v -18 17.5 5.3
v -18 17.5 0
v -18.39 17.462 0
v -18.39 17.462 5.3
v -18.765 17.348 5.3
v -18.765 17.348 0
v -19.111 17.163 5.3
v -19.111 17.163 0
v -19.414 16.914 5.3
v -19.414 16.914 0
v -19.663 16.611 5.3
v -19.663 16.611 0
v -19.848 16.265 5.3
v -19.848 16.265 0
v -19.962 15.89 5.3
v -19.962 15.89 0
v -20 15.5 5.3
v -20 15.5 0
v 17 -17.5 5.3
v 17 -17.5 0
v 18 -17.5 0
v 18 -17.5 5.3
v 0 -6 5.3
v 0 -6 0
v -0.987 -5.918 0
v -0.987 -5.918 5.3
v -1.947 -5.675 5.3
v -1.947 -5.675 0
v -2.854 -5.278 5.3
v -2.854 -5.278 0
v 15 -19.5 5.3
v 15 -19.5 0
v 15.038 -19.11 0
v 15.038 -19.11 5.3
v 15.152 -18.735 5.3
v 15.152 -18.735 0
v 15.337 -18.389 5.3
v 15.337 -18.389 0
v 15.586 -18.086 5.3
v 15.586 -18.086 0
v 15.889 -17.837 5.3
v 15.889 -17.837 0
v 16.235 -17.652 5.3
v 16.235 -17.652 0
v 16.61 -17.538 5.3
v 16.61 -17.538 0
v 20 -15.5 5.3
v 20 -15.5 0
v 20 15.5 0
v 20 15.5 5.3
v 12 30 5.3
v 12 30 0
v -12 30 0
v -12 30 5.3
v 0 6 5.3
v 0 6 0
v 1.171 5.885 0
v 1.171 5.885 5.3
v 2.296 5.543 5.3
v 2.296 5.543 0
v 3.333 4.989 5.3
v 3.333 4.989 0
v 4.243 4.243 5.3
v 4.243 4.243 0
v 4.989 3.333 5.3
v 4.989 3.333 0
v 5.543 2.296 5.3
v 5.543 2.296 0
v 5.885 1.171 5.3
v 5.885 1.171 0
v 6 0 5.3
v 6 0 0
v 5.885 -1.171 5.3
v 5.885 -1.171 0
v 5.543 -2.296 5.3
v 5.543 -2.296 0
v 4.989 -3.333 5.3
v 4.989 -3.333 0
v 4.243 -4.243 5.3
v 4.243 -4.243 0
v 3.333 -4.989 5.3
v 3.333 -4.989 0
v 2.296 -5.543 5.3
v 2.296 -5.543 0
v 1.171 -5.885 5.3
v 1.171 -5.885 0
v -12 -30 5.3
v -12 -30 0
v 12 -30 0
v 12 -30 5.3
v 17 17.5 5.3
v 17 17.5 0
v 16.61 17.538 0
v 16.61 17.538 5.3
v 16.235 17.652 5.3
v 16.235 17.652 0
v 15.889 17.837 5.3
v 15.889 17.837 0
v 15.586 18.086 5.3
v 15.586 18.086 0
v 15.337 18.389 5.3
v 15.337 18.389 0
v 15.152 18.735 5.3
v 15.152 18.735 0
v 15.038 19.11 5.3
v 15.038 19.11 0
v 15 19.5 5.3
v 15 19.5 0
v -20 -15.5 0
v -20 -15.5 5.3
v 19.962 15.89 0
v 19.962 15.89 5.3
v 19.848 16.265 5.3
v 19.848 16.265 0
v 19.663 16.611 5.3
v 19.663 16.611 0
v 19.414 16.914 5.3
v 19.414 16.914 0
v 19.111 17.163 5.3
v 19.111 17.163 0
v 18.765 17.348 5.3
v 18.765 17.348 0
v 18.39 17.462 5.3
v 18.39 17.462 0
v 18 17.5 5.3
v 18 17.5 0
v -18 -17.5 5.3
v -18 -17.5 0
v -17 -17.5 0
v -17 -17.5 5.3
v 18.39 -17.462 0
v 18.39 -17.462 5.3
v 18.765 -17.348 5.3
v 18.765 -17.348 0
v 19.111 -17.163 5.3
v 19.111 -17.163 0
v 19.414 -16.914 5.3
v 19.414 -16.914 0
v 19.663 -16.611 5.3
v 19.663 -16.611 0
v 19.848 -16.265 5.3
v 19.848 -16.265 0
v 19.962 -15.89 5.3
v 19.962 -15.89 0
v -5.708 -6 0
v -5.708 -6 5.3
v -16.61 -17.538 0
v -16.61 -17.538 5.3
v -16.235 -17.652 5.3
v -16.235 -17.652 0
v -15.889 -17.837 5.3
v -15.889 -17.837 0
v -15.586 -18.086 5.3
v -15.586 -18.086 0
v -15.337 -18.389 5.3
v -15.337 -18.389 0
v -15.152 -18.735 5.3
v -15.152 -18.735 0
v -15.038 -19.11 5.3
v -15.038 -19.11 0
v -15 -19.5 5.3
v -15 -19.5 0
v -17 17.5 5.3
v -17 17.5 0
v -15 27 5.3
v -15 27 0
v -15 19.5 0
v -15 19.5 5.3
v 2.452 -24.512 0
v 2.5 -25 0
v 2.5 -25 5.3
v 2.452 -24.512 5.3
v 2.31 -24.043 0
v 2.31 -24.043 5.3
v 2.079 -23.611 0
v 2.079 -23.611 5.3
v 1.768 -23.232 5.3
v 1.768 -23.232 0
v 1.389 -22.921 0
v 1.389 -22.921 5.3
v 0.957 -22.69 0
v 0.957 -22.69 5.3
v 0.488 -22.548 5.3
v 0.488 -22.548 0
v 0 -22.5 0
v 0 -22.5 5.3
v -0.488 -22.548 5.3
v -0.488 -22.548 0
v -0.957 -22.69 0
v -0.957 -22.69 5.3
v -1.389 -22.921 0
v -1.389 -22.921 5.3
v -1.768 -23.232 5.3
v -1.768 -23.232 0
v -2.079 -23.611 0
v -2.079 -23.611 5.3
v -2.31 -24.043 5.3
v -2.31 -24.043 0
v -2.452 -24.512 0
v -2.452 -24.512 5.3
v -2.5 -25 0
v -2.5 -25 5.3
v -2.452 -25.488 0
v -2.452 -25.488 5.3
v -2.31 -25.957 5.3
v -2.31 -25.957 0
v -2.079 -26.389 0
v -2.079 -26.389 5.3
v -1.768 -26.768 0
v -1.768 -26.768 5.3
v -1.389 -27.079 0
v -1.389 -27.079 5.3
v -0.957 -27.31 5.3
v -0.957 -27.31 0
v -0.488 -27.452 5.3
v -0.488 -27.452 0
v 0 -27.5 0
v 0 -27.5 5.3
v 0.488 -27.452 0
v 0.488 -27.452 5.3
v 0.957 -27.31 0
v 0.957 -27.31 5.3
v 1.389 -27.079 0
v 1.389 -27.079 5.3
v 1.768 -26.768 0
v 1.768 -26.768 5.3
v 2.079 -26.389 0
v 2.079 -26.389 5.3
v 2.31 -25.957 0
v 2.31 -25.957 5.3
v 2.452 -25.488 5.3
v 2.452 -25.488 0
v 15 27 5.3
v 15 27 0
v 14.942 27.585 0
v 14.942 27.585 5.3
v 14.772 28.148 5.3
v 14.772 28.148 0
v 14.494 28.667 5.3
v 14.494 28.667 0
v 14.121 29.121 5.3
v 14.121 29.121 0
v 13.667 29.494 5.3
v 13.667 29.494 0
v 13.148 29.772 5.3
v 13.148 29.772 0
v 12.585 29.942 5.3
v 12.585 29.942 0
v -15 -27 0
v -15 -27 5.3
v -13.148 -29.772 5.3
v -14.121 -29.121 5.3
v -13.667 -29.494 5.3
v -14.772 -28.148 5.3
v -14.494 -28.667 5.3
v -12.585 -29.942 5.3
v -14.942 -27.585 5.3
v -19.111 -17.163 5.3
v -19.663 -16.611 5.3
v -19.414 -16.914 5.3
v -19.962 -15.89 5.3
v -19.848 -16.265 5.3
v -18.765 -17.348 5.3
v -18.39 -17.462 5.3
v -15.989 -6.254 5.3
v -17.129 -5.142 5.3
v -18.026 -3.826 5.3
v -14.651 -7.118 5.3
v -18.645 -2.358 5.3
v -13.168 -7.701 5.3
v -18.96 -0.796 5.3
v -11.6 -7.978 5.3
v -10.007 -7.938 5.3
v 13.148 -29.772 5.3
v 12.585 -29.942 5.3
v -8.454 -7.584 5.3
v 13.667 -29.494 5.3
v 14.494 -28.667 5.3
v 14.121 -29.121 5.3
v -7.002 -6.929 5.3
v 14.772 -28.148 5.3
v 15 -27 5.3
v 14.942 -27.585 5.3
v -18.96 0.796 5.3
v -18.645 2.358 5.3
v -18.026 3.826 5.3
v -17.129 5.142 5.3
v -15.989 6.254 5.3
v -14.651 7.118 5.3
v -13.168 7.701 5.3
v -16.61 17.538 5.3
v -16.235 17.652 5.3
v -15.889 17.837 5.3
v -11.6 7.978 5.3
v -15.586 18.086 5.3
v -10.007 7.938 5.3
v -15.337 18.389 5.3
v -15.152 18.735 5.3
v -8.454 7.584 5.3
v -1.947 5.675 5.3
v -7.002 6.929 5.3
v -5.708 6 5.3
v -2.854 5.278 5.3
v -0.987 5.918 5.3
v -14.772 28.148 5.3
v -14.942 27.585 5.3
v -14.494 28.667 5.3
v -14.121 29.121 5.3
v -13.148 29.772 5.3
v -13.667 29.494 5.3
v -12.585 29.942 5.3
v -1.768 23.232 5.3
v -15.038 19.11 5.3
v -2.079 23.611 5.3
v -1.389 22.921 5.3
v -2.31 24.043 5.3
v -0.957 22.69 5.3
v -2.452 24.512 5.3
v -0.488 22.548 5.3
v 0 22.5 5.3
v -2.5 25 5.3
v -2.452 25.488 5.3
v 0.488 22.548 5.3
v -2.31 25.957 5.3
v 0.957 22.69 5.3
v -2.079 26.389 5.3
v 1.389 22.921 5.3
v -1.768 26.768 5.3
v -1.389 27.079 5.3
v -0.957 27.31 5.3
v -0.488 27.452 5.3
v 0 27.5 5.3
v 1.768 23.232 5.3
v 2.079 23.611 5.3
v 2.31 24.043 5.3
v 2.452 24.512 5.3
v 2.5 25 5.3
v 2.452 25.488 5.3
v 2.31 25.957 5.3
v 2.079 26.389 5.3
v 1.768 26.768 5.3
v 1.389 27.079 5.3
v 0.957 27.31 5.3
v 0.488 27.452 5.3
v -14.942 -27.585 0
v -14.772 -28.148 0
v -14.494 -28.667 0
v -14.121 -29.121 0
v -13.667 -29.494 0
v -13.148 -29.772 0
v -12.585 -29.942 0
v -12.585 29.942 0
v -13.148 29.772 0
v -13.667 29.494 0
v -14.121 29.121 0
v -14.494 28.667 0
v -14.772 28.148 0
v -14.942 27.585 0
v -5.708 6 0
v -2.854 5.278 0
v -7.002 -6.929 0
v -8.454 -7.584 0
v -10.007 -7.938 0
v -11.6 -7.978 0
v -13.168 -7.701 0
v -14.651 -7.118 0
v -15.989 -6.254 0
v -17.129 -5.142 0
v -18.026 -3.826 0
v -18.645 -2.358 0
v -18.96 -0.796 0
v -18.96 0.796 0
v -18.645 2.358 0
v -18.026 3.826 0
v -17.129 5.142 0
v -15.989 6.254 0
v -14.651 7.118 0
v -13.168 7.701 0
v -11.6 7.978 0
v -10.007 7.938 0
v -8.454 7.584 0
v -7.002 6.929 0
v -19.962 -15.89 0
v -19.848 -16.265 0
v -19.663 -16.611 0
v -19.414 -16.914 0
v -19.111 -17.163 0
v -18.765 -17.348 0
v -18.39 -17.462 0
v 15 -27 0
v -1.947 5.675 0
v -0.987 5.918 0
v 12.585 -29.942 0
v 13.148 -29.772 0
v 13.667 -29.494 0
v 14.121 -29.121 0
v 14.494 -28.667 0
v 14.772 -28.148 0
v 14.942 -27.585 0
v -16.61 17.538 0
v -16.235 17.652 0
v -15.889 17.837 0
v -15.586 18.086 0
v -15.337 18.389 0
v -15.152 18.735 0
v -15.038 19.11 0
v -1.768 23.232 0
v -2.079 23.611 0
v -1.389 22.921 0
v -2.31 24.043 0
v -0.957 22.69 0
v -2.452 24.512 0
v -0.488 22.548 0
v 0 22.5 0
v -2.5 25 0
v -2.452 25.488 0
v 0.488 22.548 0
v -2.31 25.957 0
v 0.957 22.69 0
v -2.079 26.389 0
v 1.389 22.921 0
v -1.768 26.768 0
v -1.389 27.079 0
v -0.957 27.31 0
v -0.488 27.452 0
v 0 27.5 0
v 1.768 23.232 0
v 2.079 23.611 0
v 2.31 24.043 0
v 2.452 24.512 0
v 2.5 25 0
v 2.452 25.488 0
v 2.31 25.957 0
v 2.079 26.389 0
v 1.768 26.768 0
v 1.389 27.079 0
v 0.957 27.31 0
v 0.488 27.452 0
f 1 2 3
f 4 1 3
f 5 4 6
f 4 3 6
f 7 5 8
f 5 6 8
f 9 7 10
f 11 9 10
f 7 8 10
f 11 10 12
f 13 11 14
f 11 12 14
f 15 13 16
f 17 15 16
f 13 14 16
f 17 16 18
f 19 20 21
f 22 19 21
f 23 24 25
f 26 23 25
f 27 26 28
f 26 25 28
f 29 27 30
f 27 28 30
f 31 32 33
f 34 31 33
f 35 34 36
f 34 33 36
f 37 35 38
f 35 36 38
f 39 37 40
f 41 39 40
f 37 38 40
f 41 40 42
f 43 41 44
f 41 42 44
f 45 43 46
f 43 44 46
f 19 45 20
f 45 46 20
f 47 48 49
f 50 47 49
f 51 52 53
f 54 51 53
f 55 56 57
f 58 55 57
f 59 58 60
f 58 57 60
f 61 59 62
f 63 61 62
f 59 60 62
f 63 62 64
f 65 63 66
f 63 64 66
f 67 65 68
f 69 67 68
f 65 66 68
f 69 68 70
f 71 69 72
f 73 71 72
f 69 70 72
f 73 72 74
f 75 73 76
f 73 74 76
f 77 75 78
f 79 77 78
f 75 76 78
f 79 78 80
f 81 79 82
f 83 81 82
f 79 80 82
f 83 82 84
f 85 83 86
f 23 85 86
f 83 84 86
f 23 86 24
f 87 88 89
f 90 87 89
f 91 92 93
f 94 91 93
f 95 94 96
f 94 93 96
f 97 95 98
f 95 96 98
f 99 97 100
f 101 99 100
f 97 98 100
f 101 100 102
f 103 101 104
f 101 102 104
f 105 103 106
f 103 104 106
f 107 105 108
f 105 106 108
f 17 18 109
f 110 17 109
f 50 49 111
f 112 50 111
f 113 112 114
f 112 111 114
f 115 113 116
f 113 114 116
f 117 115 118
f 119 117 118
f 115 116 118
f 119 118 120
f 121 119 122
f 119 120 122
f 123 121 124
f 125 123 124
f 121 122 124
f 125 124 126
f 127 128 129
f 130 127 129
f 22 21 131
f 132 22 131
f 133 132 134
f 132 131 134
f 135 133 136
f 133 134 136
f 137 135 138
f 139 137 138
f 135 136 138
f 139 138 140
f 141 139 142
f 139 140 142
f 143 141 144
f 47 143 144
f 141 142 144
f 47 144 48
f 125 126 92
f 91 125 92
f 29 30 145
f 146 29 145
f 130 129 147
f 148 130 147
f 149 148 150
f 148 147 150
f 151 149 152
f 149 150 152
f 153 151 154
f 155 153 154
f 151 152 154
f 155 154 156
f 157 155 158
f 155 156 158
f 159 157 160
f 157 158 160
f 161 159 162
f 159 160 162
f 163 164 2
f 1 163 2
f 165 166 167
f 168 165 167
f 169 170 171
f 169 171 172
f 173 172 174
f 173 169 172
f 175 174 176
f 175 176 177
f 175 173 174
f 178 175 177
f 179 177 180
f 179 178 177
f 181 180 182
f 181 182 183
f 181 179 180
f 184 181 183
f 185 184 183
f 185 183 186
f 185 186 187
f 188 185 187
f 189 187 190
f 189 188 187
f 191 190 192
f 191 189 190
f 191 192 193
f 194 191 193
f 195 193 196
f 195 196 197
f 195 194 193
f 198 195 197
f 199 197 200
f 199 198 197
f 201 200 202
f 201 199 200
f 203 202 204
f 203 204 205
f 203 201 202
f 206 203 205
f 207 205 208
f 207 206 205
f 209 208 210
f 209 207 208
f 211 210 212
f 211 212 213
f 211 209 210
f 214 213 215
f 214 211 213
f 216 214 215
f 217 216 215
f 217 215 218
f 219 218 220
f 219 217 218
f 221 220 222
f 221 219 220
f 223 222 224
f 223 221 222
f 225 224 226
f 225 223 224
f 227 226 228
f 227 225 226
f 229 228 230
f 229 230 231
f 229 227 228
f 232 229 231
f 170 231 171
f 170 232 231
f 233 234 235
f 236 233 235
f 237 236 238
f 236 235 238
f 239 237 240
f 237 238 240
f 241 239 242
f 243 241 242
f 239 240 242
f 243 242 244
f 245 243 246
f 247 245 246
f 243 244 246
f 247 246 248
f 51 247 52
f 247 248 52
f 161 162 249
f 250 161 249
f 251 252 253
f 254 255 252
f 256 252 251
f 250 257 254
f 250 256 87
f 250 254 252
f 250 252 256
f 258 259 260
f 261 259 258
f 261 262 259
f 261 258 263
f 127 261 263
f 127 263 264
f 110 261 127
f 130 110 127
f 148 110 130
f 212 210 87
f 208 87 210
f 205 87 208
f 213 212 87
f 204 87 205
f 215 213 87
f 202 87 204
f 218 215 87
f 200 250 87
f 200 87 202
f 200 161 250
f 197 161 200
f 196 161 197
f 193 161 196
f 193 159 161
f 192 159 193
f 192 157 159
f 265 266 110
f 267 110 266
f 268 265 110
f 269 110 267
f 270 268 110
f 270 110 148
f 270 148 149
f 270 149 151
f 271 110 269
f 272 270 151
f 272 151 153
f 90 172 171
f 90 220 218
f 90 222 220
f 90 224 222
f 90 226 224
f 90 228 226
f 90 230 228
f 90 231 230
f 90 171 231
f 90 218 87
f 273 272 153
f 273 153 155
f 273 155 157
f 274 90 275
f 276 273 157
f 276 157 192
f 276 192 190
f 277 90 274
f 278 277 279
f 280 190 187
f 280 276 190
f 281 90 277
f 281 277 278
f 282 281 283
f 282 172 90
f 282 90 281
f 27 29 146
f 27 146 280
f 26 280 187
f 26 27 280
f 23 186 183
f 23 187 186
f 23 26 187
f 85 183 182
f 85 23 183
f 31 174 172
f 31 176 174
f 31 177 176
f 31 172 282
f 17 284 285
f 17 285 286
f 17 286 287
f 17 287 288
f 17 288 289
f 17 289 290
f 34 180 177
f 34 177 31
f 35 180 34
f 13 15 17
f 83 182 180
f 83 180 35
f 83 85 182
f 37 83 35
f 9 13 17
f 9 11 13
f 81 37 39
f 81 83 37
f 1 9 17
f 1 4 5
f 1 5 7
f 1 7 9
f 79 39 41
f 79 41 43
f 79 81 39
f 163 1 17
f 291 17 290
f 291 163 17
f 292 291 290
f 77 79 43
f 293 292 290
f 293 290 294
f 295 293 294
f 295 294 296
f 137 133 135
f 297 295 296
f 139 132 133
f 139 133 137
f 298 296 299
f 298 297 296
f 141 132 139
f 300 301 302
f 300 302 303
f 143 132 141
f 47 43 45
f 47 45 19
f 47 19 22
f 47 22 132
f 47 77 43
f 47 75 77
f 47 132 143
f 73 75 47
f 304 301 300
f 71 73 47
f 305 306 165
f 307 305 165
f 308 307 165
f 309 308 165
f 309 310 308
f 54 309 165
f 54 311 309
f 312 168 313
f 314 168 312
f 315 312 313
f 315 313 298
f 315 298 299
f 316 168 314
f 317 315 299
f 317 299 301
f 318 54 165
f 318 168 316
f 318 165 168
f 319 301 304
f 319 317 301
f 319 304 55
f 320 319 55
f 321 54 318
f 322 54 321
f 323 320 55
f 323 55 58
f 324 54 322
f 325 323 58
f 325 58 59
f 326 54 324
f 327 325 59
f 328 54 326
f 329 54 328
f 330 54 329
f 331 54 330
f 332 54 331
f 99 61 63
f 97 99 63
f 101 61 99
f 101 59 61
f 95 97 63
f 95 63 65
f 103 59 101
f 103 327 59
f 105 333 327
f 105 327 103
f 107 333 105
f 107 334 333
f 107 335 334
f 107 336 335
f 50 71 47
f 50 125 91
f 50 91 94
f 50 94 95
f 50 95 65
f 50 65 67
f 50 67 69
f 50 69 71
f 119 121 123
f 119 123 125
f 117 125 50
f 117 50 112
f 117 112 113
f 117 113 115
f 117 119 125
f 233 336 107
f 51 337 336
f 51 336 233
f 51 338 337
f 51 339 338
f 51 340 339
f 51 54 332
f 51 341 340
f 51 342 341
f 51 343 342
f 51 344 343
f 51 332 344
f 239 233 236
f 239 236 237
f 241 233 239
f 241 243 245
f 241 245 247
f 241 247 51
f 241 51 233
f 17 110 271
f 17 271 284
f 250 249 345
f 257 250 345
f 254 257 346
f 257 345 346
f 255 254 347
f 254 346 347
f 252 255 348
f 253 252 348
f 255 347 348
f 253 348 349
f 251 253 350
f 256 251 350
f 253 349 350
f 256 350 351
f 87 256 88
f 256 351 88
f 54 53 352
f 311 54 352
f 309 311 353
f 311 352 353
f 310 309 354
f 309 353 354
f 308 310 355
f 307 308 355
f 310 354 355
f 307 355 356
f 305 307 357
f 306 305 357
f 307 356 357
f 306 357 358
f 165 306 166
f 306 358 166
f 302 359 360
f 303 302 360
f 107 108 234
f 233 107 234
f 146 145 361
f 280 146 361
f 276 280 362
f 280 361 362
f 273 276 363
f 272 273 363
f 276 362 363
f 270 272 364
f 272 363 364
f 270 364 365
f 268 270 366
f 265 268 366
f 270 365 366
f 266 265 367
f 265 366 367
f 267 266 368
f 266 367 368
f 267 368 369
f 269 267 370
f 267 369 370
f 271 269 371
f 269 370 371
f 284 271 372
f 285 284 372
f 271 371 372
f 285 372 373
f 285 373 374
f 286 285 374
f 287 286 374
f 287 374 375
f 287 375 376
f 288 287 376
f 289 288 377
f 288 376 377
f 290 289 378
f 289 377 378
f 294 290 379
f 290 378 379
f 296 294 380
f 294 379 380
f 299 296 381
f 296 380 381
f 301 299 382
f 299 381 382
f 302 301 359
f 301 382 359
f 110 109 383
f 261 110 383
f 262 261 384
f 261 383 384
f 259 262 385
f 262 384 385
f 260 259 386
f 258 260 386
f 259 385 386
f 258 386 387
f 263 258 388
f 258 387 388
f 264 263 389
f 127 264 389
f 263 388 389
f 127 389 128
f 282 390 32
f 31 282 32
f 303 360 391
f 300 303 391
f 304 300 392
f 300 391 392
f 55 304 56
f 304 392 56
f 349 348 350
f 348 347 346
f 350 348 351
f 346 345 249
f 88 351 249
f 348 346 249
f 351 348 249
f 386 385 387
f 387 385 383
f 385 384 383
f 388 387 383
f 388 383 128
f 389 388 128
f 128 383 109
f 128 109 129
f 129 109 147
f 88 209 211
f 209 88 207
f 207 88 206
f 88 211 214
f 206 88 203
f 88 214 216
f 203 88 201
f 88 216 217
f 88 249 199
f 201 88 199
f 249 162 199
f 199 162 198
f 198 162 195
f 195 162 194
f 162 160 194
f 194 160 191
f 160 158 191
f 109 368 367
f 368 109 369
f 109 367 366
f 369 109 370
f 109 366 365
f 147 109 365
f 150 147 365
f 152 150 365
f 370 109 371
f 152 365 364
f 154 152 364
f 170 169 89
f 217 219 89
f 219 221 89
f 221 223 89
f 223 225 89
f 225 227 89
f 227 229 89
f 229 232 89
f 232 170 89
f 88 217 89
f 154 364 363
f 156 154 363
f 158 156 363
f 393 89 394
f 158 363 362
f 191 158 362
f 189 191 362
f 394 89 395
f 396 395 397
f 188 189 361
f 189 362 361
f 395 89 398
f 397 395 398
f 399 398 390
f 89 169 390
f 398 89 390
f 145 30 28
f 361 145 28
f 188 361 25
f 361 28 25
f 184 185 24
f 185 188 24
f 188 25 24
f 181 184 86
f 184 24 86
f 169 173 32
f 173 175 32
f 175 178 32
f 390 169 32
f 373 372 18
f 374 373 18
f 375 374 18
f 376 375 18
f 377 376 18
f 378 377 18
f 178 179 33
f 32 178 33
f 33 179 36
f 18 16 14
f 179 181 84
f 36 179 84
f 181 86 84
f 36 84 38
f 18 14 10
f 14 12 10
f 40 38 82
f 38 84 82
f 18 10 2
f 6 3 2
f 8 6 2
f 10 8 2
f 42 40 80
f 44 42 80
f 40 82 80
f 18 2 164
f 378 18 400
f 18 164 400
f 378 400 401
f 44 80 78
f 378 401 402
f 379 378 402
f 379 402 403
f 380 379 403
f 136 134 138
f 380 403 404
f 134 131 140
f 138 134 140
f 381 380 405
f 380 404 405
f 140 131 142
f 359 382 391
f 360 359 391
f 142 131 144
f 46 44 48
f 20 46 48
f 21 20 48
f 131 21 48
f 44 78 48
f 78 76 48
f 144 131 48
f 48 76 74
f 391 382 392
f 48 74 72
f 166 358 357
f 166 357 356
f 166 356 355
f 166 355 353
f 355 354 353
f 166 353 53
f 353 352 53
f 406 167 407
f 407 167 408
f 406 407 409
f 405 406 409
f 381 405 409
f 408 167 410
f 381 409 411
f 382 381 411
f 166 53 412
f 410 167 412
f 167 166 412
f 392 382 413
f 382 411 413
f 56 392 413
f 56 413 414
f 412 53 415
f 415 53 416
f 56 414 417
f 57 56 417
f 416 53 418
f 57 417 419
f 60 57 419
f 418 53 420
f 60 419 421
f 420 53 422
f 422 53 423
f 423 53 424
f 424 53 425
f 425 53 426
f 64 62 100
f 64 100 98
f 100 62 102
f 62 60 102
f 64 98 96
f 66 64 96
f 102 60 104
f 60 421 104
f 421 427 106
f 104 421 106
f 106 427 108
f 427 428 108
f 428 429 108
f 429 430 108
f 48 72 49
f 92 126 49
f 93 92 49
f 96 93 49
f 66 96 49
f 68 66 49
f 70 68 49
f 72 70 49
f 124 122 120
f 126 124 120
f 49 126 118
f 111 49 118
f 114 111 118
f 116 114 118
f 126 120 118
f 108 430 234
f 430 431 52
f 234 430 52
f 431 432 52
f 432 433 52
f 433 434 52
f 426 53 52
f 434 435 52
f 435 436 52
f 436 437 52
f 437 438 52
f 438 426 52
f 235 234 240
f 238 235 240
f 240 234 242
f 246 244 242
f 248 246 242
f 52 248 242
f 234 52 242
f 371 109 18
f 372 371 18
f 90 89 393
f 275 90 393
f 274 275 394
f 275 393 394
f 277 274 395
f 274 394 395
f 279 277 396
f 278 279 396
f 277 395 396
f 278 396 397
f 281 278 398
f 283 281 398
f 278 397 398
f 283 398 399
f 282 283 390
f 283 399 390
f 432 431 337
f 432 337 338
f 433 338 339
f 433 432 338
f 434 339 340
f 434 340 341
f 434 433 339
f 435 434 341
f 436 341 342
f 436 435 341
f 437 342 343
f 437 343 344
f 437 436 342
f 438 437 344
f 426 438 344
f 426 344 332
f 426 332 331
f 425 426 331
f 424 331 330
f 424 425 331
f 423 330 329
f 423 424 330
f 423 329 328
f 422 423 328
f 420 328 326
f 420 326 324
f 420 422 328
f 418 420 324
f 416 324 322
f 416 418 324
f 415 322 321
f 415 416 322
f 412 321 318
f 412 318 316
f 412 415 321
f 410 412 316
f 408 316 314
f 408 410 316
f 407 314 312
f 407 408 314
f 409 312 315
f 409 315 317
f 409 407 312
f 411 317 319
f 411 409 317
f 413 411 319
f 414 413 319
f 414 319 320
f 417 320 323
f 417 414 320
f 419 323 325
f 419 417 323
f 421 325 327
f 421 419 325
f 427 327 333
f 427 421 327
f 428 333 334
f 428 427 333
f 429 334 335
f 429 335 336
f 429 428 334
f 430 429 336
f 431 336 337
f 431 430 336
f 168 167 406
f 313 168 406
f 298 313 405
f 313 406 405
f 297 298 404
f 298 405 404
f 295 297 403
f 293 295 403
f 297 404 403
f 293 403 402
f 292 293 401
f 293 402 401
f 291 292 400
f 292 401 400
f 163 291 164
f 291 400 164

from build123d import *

# Parameters (mm, degrees)
F0_R     = 2.5
F1_DEPTH = 5.3


with BuildPart() as f1:
    # F0 (on Top) → F1 (new body)
    with BuildSketch(Plane.XY):
        with BuildLine():
            Line((-12, -30), (12, -30))
            ThreePointArc((12, -30), (14.12132, -29.12132), (15, -27))
            Line((15, -27), (15, -19.5))
            ThreePointArc((15, -19.5), (15.585786, -18.085786), (17, -17.5))
            Line((17, -17.5), (18, -17.5))
            ThreePointArc((18, -17.5), (19.414214, -16.914214), (20, -15.5))
            Line((20, -15.5), (20, 15.5))
            ThreePointArc((20, 15.5), (19.414214, 16.914214), (18, 17.5))
            Line((18, 17.5), (17, 17.5))
            ThreePointArc((17, 17.5), (15.585786, 18.085786), (15, 19.5))
            Line((15, 19.5), (15, 27))
            ThreePointArc((15, 27), (14.12132, 29.12132), (12, 30))
            Line((12, 30), (-12, 30))
            ThreePointArc((-12, 30), (-14.12132, 29.12132), (-15, 27))
            Line((-15, 27), (-15, 19.5))
            ThreePointArc((-15, 19.5), (-15.585786, 18.085786), (-17, 17.5))
            Line((-17, 17.5), (-18, 17.5))
            ThreePointArc((-18, 17.5), (-19.414214, 16.914214), (-20, 15.5))
            Line((-20, 15.5), (-20, -15.5))
            ThreePointArc((-20, -15.5), (-19.414214, -16.914214), (-18, -17.5))
            Line((-18, -17.5), (-17, -17.5))
            ThreePointArc((-17, -17.5), (-15.585786, -18.085786), (-15, -19.5))
            Line((-15, -19.5), (-15, -27))
            ThreePointArc((-15, -27), (-14.12132, -29.12132), (-12, -30))
        make_face()
        with Locations((0, -25)):
            Circle(F0_R, mode=Mode.SUBTRACT)
        with BuildLine():
            ThreePointArc((-5.708497, -6), (-19, 0), (-5.708497, 6))
            Line((-5.708497, 6), (-2.854249, 5.277619))
            ThreePointArc((-2.854249, 5.277619), (-1.472122, 5.816602), (0, 6))
            ThreePointArc((0, 6), (6, 0), (0, -6))
            ThreePointArc((0, -6), (-1.472122, -5.816602), (-2.854249, -5.277619))
            Line((-2.854249, -5.277619), (-5.708497, -6))
        make_face(mode=Mode.SUBTRACT)
        with Locations((0, 25)):
            Circle(F0_R, mode=Mode.SUBTRACT)
    extrude(amount=F1_DEPTH)


solid = f1.part
